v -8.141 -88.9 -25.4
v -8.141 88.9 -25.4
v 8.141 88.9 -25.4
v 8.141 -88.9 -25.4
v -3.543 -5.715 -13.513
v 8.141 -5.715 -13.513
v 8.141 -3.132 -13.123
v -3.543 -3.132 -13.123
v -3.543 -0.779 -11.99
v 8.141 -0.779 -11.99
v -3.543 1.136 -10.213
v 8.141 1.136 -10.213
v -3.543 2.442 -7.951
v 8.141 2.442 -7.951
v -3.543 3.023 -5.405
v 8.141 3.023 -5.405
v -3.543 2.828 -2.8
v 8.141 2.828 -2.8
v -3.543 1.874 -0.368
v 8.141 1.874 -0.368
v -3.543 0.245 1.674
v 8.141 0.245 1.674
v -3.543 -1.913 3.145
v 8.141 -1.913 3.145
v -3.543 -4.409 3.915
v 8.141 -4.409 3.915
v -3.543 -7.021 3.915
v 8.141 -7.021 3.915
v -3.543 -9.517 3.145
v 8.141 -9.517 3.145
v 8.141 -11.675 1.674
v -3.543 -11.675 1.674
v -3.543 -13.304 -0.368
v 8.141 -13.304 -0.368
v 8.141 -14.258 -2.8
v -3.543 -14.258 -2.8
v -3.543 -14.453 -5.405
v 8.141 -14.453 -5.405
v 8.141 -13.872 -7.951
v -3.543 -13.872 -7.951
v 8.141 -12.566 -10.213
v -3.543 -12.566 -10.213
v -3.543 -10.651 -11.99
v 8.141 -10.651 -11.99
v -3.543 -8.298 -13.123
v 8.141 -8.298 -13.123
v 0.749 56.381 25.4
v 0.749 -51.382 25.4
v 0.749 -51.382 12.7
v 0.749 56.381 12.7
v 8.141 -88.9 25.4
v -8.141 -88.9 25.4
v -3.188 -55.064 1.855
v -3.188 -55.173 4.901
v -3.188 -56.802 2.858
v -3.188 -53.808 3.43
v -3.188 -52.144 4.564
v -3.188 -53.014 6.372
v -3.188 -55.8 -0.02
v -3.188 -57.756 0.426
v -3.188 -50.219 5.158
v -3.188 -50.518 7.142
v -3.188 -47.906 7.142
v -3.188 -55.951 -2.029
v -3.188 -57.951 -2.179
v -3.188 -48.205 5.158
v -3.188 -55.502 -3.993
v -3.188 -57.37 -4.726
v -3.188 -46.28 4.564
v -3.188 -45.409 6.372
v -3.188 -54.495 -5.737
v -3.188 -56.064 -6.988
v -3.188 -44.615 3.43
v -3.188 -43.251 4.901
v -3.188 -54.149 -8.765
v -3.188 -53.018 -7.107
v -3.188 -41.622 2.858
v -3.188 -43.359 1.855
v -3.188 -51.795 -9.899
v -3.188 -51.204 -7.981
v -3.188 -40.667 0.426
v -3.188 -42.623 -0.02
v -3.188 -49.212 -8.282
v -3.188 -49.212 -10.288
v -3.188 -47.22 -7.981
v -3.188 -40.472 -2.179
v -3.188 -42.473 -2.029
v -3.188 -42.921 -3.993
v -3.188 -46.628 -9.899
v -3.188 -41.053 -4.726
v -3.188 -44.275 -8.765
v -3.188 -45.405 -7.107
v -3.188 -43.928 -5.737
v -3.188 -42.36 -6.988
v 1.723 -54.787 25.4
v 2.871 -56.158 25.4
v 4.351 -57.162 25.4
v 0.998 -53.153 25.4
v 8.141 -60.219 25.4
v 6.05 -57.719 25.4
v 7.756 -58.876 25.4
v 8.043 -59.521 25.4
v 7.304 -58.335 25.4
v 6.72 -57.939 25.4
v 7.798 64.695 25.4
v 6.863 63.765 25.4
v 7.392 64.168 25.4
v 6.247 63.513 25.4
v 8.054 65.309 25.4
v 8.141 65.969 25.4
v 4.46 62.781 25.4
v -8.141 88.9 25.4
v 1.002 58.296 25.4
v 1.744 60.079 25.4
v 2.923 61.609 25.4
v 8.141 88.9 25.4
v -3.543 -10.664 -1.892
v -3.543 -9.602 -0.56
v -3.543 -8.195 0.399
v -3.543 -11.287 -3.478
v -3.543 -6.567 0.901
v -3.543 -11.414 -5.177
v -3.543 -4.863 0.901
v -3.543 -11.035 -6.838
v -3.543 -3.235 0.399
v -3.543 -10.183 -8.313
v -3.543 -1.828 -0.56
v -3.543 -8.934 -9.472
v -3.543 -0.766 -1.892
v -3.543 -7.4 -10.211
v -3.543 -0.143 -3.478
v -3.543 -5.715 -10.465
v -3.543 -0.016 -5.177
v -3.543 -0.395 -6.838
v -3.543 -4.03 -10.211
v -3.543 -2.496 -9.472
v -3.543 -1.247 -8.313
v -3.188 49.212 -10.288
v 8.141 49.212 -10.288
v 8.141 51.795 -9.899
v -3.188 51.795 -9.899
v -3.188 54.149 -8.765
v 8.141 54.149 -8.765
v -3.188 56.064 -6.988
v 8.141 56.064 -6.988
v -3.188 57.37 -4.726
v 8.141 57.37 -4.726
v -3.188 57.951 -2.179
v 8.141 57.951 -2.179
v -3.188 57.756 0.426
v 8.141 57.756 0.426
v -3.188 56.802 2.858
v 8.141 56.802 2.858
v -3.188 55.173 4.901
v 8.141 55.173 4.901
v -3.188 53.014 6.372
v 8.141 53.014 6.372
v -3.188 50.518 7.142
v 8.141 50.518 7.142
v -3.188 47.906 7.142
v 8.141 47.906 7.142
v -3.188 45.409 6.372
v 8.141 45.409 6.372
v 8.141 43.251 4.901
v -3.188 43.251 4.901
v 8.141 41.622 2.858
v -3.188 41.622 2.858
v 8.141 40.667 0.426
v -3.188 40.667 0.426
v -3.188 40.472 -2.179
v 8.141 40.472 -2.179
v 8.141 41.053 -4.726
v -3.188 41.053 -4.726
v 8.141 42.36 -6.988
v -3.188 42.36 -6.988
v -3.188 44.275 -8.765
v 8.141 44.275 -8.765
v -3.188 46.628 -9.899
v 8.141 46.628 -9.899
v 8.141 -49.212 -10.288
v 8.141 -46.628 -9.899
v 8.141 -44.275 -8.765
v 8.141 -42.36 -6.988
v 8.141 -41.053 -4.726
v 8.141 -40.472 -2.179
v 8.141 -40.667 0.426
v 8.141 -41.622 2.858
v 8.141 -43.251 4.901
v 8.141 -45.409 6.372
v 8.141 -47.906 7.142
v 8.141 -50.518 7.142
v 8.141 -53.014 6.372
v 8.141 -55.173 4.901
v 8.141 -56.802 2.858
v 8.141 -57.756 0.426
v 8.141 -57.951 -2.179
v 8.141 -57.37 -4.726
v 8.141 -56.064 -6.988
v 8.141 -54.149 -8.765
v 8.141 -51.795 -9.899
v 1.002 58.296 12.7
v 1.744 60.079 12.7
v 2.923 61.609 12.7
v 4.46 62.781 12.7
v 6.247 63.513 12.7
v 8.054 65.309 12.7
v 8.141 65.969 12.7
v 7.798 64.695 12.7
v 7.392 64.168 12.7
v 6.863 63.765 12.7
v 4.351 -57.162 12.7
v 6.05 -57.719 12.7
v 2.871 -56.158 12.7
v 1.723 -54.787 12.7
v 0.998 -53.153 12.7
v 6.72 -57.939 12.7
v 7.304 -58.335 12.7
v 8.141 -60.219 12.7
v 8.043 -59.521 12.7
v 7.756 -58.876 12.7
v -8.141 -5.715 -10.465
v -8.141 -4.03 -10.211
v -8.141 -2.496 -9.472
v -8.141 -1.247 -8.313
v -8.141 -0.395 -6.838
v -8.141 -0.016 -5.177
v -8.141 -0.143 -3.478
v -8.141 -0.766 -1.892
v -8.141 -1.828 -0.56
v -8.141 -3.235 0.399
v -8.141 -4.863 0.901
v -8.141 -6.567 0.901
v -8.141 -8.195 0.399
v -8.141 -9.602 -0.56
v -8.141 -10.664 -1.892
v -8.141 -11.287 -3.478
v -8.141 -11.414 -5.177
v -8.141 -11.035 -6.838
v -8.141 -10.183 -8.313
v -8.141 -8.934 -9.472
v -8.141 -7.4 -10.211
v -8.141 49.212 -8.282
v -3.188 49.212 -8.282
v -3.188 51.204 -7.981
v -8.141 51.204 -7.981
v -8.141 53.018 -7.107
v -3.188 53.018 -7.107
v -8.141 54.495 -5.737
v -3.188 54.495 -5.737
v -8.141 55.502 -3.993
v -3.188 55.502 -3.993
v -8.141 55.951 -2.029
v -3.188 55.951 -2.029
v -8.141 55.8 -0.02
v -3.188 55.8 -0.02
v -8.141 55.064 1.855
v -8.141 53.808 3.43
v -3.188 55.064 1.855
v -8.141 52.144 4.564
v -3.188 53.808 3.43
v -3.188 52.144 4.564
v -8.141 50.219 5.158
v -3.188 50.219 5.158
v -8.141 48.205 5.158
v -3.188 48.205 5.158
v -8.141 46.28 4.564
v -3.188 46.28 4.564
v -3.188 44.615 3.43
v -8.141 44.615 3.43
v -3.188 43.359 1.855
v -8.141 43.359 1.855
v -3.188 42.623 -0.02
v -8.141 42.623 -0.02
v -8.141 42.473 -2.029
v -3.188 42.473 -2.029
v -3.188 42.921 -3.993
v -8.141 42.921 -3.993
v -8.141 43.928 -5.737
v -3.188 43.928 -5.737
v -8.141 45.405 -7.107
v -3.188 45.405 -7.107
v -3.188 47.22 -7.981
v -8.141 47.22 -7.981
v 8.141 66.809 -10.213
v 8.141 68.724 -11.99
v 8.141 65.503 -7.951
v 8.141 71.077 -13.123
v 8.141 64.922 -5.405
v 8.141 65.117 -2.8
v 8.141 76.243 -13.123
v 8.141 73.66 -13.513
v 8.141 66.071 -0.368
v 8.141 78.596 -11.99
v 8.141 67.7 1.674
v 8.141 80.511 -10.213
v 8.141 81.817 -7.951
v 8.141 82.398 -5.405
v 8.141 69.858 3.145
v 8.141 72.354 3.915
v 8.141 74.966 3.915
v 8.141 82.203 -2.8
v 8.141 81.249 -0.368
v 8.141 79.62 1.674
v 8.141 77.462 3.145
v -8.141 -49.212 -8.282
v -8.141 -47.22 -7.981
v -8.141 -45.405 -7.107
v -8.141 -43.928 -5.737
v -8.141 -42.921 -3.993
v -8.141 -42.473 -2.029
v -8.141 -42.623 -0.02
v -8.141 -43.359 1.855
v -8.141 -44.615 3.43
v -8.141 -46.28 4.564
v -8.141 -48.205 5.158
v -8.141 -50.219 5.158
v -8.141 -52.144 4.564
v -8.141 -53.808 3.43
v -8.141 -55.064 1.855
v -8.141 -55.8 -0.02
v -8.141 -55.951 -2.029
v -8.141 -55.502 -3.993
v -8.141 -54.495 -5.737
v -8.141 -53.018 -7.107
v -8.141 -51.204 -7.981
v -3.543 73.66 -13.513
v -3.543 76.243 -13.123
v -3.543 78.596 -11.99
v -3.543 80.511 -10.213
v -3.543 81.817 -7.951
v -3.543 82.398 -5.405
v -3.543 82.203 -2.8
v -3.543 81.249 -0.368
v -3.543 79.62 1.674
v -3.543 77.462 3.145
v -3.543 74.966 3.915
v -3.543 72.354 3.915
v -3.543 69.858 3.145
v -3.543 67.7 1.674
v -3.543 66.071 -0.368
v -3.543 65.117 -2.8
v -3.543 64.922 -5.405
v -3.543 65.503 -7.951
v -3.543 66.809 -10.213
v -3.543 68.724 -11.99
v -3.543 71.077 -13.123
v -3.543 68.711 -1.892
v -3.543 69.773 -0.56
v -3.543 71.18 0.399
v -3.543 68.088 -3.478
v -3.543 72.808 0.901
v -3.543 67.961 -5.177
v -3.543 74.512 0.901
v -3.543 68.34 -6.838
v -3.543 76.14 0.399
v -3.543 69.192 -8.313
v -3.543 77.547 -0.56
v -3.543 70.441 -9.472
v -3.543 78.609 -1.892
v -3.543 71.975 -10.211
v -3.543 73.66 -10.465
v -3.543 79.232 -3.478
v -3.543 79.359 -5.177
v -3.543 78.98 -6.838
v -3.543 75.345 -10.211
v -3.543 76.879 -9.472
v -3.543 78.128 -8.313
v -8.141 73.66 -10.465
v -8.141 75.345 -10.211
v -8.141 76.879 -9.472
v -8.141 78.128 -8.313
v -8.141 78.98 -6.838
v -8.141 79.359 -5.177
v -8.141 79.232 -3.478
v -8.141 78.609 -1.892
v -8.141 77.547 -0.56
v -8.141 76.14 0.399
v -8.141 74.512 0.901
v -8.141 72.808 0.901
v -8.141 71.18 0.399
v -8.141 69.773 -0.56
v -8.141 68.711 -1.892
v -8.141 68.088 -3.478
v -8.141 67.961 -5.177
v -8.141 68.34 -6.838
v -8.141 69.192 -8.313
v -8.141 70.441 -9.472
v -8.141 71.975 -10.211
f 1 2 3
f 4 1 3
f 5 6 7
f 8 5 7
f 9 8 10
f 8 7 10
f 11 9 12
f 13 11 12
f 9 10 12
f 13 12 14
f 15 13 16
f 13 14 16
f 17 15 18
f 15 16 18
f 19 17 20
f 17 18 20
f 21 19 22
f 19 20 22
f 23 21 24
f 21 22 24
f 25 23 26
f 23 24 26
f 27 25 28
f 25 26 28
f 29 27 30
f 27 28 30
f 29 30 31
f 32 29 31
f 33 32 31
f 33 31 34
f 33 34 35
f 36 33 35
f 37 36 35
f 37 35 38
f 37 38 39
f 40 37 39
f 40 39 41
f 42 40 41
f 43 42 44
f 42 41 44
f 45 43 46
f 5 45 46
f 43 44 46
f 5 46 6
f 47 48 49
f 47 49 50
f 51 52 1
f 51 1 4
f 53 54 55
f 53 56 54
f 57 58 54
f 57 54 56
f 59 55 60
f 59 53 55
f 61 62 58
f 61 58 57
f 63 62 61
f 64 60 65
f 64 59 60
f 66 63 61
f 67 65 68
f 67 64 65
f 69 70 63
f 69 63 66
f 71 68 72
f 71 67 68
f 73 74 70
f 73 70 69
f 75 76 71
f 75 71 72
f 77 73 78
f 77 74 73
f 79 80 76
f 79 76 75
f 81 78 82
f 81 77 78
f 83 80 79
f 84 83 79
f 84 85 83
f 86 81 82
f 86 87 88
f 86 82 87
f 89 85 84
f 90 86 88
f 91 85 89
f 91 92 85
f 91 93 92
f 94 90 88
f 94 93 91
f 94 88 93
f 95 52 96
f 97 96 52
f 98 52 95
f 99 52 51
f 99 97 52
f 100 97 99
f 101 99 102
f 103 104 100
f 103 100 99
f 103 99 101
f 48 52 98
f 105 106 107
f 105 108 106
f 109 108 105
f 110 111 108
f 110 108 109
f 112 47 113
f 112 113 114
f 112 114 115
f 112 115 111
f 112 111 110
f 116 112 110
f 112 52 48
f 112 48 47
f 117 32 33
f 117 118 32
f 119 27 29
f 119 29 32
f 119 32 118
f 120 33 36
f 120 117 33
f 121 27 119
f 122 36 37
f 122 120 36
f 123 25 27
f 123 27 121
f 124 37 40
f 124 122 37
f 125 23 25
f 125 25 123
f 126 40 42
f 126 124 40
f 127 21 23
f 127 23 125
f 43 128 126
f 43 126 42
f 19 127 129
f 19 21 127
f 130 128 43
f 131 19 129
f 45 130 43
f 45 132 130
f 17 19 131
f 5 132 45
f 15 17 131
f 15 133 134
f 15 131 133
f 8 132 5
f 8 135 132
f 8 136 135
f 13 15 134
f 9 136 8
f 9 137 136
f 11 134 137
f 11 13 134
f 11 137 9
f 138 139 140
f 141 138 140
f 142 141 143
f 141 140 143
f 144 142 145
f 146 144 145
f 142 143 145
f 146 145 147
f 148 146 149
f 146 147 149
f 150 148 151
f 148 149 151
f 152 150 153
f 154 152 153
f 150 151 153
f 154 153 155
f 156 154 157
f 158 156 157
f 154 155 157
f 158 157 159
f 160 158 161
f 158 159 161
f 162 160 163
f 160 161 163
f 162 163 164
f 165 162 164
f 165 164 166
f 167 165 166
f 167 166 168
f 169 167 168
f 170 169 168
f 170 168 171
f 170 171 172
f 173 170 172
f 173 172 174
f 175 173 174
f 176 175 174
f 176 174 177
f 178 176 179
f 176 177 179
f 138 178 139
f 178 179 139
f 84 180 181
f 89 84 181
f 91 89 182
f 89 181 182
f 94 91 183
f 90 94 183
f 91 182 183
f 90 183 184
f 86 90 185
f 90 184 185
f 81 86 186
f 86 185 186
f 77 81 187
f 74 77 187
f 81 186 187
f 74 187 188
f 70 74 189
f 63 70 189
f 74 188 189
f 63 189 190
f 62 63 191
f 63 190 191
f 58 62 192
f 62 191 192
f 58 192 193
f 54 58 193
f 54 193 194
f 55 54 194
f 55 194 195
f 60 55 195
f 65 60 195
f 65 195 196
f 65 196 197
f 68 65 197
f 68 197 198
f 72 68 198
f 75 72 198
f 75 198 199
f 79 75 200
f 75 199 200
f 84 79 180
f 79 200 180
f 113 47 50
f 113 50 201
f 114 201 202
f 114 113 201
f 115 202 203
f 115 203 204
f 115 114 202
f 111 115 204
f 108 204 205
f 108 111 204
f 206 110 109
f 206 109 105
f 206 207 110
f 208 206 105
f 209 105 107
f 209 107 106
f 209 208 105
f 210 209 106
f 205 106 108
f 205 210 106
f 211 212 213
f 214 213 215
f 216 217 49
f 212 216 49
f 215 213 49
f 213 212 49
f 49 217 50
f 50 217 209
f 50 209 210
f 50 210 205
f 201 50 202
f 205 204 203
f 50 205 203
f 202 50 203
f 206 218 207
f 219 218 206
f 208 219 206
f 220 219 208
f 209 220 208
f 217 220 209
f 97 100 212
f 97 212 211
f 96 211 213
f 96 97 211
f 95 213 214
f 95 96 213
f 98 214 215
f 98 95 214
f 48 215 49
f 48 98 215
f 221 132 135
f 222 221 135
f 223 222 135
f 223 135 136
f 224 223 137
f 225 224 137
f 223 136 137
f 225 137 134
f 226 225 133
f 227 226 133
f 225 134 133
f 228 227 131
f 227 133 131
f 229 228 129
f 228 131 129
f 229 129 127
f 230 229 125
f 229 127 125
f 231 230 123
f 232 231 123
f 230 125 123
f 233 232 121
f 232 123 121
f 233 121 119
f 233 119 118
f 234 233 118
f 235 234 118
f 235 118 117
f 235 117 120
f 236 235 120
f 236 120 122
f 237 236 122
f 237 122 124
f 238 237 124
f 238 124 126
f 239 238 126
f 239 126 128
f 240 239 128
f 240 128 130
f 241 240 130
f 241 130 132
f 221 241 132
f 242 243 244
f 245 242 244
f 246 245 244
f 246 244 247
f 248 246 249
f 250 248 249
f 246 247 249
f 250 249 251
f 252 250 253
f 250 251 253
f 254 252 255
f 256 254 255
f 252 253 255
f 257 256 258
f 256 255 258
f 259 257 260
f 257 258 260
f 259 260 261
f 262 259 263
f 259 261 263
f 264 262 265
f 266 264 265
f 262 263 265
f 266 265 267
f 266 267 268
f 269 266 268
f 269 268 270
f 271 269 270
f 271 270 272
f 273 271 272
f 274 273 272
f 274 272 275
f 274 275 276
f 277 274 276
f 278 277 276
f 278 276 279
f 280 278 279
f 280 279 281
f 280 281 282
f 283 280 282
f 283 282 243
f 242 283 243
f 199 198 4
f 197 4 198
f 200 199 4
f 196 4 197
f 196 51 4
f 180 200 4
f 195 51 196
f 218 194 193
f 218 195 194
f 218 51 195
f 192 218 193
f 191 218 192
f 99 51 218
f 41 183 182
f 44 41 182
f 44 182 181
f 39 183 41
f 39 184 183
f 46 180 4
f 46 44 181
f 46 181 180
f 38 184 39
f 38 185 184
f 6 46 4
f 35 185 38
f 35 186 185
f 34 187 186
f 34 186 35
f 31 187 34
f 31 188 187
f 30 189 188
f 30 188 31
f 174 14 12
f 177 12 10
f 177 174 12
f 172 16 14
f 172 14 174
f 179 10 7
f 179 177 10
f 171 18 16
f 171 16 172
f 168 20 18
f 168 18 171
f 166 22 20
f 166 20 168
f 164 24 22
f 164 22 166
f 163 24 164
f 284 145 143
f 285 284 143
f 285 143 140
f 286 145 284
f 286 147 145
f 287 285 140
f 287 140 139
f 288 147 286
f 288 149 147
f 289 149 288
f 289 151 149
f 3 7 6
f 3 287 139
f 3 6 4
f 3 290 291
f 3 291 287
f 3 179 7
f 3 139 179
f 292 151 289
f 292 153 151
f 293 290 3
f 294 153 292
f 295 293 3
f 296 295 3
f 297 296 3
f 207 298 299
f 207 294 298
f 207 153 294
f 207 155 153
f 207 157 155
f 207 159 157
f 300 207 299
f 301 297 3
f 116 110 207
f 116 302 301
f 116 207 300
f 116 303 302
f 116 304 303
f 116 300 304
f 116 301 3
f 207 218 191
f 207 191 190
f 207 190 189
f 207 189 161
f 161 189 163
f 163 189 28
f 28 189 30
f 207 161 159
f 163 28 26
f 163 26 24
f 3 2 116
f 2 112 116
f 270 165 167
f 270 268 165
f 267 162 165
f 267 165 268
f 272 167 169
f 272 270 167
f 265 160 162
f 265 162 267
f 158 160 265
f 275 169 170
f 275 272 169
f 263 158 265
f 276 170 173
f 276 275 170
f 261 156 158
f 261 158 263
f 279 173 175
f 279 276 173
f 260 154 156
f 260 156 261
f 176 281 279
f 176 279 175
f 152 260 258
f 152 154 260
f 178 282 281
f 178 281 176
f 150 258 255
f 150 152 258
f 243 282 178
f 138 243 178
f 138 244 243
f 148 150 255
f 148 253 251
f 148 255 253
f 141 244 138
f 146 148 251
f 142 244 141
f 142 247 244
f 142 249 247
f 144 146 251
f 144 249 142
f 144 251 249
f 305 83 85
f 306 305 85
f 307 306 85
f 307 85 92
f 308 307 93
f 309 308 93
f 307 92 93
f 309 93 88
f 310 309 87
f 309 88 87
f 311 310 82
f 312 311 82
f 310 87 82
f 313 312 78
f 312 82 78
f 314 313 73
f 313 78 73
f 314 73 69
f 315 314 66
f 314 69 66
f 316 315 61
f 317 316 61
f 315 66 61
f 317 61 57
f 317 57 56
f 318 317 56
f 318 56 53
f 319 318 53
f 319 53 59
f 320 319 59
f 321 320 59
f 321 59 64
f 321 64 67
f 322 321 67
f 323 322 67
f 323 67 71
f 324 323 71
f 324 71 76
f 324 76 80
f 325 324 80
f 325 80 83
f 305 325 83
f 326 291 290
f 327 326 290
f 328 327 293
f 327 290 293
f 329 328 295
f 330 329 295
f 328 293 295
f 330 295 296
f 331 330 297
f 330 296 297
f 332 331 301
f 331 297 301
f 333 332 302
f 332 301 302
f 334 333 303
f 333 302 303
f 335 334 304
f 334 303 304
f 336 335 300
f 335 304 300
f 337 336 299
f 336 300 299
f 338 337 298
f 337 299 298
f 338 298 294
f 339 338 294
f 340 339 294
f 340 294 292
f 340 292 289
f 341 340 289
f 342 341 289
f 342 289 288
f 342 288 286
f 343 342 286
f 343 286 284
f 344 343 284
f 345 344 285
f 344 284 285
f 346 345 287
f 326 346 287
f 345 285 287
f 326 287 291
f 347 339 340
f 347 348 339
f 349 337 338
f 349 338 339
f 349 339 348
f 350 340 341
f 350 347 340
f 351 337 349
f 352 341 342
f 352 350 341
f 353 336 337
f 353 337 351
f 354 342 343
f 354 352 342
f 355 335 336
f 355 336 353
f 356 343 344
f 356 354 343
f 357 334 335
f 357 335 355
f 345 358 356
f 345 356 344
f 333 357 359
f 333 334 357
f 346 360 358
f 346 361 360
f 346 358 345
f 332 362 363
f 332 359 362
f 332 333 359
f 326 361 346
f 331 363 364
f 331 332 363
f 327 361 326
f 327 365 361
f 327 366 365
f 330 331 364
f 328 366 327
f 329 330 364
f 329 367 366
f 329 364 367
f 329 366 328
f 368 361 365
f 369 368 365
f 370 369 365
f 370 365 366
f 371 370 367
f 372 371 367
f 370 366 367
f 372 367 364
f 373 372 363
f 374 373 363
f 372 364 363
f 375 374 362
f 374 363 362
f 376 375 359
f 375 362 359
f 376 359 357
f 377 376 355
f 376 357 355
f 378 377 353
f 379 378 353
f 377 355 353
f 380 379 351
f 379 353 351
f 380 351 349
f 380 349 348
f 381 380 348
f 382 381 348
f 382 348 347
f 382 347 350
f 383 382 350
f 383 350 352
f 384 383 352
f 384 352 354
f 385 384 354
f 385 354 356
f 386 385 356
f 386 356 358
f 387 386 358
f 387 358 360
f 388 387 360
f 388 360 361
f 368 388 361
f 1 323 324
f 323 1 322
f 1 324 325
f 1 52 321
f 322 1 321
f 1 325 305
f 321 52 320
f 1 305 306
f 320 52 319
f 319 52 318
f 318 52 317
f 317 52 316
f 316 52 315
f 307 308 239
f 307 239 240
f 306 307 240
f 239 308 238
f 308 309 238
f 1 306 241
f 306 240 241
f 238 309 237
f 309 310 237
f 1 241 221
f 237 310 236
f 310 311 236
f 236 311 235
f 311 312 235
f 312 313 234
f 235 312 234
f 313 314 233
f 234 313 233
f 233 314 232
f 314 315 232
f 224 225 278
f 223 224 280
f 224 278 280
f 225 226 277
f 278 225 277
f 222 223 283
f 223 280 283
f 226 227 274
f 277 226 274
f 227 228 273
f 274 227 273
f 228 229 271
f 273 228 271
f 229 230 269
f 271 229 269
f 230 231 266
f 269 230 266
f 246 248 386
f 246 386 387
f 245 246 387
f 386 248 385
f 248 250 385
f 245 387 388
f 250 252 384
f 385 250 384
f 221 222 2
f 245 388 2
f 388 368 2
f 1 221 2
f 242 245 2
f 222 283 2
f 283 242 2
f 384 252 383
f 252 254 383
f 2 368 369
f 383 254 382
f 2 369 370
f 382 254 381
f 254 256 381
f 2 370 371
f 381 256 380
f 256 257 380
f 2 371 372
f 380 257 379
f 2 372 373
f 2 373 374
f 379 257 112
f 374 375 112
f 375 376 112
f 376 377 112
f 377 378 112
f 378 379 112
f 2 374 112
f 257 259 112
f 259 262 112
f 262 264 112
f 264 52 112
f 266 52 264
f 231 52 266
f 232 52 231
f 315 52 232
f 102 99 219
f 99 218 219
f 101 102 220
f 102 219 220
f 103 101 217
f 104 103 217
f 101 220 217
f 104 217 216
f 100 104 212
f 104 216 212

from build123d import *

# Parameters (mm, degrees)
SKETCH1_W           = 16.2814
SKETCH1_H           = 177.8
BOSS_EXTRUDE1_DEPTH = 25.4
SKETCH2_R           = 6.75767
CUT_EXTRUDE1_DEPTH  = 94.879997795
SKETCH3_R           = 8.7641176
CUT_EXTRUDE2_DEPTH  = 11.3284
CUT_EXTRUDE3_DEPTH  = 12.7
SKETCH5_R           = 5.715
CUT_EXTRUDE4_DEPTH  = 94.879997795
SKETCH6_R           = 8.763
CUT_EXTRUDE5_DEPTH  = 11.684
FILLET1_R           = 2.54


with BuildPart() as part:
    # Sketch1 → Boss-Extrude1 (new, symmetric)
    with BuildSketch(Plane.XY):
        Rectangle(SKETCH1_W, SKETCH1_H)
    extrude(amount=BOSS_EXTRUDE1_DEPTH, both=True)

    # Sketch2 → Cut-Extrude1 (cut, through all)
    with BuildSketch(Plane(origin=(8.1407, 0, 0), x_dir=(0, 0, -1), z_dir=(1, 0, 0))):
        with Locations((1.524, 49.211738)):
            Circle(SKETCH2_R)
        with Locations((1.524, -49.211738)):
            Circle(SKETCH2_R)
    extrude(amount=-CUT_EXTRUDE1_DEPTH, mode=Mode.SUBTRACT)

    # Sketch3 → Cut-Extrude2 (cut)
    with BuildSketch(Plane(origin=(8.1407, 0, 0), x_dir=(0, 0, -1), z_dir=(1, 0, 0))):
        with Locations((1.524, 49.211738)):
            Circle(SKETCH3_R)
        with Locations((1.524, -49.211738)):
            Circle(SKETCH3_R)
    extrude(amount=-CUT_EXTRUDE2_DEPTH, mode=Mode.SUBTRACT)

    # Sketch4 → Cut-Extrude3 (cut)
    with BuildSketch(Plane.XY.offset(25.4)):
        with BuildLine():
            Line((0.7493, -51.381727108), (0.7493, 56.38057714))
            ThreePointArc((0.7493, 56.38057714), (2.915188991, 61.601284707), (8.1407, 63.755558905))
            Line((8.1407, 63.755558905), (8.1407, -57.749786229))
            ThreePointArc((8.1407, -57.749786229), (2.985440135, -56.259866378), (0.7493, -51.381727108))
        make_face()
    extrude(amount=-CUT_EXTRUDE3_DEPTH, mode=Mode.SUBTRACT)

    # Sketch5 → Cut-Extrude4 (cut, through all)
    with BuildSketch(Plane(origin=(8.1407, 0, 0), x_dir=(0, 0, -1), z_dir=(1, 0, 0))):
        with Locations((4.7498, -5.715)):
            Circle(SKETCH5_R)
        with Locations((4.7498, 73.66)):
            Circle(SKETCH5_R)
    extrude(amount=-CUT_EXTRUDE4_DEPTH, mode=Mode.SUBTRACT)

    # Sketch6 → Cut-Extrude5 (cut)
    with BuildSketch(Plane(origin=(8.1407, 0, 0), x_dir=(0, 0, -1), z_dir=(1, 0, 0))):
        with Locations((4.7498, -5.715)):
            Circle(SKETCH6_R)
        with Locations((4.7498, 73.66)):
            Circle(SKETCH6_R)
    extrude(amount=-CUT_EXTRUDE5_DEPTH, mode=Mode.SUBTRACT)

    # Fillet1
    fillet1_edges = [part.edges().sort_by_distance(p)[0] for p in [
        (8.1407, -57.749786229, 19.05),
        (8.1407, 63.755558905, 19.05),
    ]]
    fillet(fillet1_edges, radius=FILLET1_R)


solid = part.part
